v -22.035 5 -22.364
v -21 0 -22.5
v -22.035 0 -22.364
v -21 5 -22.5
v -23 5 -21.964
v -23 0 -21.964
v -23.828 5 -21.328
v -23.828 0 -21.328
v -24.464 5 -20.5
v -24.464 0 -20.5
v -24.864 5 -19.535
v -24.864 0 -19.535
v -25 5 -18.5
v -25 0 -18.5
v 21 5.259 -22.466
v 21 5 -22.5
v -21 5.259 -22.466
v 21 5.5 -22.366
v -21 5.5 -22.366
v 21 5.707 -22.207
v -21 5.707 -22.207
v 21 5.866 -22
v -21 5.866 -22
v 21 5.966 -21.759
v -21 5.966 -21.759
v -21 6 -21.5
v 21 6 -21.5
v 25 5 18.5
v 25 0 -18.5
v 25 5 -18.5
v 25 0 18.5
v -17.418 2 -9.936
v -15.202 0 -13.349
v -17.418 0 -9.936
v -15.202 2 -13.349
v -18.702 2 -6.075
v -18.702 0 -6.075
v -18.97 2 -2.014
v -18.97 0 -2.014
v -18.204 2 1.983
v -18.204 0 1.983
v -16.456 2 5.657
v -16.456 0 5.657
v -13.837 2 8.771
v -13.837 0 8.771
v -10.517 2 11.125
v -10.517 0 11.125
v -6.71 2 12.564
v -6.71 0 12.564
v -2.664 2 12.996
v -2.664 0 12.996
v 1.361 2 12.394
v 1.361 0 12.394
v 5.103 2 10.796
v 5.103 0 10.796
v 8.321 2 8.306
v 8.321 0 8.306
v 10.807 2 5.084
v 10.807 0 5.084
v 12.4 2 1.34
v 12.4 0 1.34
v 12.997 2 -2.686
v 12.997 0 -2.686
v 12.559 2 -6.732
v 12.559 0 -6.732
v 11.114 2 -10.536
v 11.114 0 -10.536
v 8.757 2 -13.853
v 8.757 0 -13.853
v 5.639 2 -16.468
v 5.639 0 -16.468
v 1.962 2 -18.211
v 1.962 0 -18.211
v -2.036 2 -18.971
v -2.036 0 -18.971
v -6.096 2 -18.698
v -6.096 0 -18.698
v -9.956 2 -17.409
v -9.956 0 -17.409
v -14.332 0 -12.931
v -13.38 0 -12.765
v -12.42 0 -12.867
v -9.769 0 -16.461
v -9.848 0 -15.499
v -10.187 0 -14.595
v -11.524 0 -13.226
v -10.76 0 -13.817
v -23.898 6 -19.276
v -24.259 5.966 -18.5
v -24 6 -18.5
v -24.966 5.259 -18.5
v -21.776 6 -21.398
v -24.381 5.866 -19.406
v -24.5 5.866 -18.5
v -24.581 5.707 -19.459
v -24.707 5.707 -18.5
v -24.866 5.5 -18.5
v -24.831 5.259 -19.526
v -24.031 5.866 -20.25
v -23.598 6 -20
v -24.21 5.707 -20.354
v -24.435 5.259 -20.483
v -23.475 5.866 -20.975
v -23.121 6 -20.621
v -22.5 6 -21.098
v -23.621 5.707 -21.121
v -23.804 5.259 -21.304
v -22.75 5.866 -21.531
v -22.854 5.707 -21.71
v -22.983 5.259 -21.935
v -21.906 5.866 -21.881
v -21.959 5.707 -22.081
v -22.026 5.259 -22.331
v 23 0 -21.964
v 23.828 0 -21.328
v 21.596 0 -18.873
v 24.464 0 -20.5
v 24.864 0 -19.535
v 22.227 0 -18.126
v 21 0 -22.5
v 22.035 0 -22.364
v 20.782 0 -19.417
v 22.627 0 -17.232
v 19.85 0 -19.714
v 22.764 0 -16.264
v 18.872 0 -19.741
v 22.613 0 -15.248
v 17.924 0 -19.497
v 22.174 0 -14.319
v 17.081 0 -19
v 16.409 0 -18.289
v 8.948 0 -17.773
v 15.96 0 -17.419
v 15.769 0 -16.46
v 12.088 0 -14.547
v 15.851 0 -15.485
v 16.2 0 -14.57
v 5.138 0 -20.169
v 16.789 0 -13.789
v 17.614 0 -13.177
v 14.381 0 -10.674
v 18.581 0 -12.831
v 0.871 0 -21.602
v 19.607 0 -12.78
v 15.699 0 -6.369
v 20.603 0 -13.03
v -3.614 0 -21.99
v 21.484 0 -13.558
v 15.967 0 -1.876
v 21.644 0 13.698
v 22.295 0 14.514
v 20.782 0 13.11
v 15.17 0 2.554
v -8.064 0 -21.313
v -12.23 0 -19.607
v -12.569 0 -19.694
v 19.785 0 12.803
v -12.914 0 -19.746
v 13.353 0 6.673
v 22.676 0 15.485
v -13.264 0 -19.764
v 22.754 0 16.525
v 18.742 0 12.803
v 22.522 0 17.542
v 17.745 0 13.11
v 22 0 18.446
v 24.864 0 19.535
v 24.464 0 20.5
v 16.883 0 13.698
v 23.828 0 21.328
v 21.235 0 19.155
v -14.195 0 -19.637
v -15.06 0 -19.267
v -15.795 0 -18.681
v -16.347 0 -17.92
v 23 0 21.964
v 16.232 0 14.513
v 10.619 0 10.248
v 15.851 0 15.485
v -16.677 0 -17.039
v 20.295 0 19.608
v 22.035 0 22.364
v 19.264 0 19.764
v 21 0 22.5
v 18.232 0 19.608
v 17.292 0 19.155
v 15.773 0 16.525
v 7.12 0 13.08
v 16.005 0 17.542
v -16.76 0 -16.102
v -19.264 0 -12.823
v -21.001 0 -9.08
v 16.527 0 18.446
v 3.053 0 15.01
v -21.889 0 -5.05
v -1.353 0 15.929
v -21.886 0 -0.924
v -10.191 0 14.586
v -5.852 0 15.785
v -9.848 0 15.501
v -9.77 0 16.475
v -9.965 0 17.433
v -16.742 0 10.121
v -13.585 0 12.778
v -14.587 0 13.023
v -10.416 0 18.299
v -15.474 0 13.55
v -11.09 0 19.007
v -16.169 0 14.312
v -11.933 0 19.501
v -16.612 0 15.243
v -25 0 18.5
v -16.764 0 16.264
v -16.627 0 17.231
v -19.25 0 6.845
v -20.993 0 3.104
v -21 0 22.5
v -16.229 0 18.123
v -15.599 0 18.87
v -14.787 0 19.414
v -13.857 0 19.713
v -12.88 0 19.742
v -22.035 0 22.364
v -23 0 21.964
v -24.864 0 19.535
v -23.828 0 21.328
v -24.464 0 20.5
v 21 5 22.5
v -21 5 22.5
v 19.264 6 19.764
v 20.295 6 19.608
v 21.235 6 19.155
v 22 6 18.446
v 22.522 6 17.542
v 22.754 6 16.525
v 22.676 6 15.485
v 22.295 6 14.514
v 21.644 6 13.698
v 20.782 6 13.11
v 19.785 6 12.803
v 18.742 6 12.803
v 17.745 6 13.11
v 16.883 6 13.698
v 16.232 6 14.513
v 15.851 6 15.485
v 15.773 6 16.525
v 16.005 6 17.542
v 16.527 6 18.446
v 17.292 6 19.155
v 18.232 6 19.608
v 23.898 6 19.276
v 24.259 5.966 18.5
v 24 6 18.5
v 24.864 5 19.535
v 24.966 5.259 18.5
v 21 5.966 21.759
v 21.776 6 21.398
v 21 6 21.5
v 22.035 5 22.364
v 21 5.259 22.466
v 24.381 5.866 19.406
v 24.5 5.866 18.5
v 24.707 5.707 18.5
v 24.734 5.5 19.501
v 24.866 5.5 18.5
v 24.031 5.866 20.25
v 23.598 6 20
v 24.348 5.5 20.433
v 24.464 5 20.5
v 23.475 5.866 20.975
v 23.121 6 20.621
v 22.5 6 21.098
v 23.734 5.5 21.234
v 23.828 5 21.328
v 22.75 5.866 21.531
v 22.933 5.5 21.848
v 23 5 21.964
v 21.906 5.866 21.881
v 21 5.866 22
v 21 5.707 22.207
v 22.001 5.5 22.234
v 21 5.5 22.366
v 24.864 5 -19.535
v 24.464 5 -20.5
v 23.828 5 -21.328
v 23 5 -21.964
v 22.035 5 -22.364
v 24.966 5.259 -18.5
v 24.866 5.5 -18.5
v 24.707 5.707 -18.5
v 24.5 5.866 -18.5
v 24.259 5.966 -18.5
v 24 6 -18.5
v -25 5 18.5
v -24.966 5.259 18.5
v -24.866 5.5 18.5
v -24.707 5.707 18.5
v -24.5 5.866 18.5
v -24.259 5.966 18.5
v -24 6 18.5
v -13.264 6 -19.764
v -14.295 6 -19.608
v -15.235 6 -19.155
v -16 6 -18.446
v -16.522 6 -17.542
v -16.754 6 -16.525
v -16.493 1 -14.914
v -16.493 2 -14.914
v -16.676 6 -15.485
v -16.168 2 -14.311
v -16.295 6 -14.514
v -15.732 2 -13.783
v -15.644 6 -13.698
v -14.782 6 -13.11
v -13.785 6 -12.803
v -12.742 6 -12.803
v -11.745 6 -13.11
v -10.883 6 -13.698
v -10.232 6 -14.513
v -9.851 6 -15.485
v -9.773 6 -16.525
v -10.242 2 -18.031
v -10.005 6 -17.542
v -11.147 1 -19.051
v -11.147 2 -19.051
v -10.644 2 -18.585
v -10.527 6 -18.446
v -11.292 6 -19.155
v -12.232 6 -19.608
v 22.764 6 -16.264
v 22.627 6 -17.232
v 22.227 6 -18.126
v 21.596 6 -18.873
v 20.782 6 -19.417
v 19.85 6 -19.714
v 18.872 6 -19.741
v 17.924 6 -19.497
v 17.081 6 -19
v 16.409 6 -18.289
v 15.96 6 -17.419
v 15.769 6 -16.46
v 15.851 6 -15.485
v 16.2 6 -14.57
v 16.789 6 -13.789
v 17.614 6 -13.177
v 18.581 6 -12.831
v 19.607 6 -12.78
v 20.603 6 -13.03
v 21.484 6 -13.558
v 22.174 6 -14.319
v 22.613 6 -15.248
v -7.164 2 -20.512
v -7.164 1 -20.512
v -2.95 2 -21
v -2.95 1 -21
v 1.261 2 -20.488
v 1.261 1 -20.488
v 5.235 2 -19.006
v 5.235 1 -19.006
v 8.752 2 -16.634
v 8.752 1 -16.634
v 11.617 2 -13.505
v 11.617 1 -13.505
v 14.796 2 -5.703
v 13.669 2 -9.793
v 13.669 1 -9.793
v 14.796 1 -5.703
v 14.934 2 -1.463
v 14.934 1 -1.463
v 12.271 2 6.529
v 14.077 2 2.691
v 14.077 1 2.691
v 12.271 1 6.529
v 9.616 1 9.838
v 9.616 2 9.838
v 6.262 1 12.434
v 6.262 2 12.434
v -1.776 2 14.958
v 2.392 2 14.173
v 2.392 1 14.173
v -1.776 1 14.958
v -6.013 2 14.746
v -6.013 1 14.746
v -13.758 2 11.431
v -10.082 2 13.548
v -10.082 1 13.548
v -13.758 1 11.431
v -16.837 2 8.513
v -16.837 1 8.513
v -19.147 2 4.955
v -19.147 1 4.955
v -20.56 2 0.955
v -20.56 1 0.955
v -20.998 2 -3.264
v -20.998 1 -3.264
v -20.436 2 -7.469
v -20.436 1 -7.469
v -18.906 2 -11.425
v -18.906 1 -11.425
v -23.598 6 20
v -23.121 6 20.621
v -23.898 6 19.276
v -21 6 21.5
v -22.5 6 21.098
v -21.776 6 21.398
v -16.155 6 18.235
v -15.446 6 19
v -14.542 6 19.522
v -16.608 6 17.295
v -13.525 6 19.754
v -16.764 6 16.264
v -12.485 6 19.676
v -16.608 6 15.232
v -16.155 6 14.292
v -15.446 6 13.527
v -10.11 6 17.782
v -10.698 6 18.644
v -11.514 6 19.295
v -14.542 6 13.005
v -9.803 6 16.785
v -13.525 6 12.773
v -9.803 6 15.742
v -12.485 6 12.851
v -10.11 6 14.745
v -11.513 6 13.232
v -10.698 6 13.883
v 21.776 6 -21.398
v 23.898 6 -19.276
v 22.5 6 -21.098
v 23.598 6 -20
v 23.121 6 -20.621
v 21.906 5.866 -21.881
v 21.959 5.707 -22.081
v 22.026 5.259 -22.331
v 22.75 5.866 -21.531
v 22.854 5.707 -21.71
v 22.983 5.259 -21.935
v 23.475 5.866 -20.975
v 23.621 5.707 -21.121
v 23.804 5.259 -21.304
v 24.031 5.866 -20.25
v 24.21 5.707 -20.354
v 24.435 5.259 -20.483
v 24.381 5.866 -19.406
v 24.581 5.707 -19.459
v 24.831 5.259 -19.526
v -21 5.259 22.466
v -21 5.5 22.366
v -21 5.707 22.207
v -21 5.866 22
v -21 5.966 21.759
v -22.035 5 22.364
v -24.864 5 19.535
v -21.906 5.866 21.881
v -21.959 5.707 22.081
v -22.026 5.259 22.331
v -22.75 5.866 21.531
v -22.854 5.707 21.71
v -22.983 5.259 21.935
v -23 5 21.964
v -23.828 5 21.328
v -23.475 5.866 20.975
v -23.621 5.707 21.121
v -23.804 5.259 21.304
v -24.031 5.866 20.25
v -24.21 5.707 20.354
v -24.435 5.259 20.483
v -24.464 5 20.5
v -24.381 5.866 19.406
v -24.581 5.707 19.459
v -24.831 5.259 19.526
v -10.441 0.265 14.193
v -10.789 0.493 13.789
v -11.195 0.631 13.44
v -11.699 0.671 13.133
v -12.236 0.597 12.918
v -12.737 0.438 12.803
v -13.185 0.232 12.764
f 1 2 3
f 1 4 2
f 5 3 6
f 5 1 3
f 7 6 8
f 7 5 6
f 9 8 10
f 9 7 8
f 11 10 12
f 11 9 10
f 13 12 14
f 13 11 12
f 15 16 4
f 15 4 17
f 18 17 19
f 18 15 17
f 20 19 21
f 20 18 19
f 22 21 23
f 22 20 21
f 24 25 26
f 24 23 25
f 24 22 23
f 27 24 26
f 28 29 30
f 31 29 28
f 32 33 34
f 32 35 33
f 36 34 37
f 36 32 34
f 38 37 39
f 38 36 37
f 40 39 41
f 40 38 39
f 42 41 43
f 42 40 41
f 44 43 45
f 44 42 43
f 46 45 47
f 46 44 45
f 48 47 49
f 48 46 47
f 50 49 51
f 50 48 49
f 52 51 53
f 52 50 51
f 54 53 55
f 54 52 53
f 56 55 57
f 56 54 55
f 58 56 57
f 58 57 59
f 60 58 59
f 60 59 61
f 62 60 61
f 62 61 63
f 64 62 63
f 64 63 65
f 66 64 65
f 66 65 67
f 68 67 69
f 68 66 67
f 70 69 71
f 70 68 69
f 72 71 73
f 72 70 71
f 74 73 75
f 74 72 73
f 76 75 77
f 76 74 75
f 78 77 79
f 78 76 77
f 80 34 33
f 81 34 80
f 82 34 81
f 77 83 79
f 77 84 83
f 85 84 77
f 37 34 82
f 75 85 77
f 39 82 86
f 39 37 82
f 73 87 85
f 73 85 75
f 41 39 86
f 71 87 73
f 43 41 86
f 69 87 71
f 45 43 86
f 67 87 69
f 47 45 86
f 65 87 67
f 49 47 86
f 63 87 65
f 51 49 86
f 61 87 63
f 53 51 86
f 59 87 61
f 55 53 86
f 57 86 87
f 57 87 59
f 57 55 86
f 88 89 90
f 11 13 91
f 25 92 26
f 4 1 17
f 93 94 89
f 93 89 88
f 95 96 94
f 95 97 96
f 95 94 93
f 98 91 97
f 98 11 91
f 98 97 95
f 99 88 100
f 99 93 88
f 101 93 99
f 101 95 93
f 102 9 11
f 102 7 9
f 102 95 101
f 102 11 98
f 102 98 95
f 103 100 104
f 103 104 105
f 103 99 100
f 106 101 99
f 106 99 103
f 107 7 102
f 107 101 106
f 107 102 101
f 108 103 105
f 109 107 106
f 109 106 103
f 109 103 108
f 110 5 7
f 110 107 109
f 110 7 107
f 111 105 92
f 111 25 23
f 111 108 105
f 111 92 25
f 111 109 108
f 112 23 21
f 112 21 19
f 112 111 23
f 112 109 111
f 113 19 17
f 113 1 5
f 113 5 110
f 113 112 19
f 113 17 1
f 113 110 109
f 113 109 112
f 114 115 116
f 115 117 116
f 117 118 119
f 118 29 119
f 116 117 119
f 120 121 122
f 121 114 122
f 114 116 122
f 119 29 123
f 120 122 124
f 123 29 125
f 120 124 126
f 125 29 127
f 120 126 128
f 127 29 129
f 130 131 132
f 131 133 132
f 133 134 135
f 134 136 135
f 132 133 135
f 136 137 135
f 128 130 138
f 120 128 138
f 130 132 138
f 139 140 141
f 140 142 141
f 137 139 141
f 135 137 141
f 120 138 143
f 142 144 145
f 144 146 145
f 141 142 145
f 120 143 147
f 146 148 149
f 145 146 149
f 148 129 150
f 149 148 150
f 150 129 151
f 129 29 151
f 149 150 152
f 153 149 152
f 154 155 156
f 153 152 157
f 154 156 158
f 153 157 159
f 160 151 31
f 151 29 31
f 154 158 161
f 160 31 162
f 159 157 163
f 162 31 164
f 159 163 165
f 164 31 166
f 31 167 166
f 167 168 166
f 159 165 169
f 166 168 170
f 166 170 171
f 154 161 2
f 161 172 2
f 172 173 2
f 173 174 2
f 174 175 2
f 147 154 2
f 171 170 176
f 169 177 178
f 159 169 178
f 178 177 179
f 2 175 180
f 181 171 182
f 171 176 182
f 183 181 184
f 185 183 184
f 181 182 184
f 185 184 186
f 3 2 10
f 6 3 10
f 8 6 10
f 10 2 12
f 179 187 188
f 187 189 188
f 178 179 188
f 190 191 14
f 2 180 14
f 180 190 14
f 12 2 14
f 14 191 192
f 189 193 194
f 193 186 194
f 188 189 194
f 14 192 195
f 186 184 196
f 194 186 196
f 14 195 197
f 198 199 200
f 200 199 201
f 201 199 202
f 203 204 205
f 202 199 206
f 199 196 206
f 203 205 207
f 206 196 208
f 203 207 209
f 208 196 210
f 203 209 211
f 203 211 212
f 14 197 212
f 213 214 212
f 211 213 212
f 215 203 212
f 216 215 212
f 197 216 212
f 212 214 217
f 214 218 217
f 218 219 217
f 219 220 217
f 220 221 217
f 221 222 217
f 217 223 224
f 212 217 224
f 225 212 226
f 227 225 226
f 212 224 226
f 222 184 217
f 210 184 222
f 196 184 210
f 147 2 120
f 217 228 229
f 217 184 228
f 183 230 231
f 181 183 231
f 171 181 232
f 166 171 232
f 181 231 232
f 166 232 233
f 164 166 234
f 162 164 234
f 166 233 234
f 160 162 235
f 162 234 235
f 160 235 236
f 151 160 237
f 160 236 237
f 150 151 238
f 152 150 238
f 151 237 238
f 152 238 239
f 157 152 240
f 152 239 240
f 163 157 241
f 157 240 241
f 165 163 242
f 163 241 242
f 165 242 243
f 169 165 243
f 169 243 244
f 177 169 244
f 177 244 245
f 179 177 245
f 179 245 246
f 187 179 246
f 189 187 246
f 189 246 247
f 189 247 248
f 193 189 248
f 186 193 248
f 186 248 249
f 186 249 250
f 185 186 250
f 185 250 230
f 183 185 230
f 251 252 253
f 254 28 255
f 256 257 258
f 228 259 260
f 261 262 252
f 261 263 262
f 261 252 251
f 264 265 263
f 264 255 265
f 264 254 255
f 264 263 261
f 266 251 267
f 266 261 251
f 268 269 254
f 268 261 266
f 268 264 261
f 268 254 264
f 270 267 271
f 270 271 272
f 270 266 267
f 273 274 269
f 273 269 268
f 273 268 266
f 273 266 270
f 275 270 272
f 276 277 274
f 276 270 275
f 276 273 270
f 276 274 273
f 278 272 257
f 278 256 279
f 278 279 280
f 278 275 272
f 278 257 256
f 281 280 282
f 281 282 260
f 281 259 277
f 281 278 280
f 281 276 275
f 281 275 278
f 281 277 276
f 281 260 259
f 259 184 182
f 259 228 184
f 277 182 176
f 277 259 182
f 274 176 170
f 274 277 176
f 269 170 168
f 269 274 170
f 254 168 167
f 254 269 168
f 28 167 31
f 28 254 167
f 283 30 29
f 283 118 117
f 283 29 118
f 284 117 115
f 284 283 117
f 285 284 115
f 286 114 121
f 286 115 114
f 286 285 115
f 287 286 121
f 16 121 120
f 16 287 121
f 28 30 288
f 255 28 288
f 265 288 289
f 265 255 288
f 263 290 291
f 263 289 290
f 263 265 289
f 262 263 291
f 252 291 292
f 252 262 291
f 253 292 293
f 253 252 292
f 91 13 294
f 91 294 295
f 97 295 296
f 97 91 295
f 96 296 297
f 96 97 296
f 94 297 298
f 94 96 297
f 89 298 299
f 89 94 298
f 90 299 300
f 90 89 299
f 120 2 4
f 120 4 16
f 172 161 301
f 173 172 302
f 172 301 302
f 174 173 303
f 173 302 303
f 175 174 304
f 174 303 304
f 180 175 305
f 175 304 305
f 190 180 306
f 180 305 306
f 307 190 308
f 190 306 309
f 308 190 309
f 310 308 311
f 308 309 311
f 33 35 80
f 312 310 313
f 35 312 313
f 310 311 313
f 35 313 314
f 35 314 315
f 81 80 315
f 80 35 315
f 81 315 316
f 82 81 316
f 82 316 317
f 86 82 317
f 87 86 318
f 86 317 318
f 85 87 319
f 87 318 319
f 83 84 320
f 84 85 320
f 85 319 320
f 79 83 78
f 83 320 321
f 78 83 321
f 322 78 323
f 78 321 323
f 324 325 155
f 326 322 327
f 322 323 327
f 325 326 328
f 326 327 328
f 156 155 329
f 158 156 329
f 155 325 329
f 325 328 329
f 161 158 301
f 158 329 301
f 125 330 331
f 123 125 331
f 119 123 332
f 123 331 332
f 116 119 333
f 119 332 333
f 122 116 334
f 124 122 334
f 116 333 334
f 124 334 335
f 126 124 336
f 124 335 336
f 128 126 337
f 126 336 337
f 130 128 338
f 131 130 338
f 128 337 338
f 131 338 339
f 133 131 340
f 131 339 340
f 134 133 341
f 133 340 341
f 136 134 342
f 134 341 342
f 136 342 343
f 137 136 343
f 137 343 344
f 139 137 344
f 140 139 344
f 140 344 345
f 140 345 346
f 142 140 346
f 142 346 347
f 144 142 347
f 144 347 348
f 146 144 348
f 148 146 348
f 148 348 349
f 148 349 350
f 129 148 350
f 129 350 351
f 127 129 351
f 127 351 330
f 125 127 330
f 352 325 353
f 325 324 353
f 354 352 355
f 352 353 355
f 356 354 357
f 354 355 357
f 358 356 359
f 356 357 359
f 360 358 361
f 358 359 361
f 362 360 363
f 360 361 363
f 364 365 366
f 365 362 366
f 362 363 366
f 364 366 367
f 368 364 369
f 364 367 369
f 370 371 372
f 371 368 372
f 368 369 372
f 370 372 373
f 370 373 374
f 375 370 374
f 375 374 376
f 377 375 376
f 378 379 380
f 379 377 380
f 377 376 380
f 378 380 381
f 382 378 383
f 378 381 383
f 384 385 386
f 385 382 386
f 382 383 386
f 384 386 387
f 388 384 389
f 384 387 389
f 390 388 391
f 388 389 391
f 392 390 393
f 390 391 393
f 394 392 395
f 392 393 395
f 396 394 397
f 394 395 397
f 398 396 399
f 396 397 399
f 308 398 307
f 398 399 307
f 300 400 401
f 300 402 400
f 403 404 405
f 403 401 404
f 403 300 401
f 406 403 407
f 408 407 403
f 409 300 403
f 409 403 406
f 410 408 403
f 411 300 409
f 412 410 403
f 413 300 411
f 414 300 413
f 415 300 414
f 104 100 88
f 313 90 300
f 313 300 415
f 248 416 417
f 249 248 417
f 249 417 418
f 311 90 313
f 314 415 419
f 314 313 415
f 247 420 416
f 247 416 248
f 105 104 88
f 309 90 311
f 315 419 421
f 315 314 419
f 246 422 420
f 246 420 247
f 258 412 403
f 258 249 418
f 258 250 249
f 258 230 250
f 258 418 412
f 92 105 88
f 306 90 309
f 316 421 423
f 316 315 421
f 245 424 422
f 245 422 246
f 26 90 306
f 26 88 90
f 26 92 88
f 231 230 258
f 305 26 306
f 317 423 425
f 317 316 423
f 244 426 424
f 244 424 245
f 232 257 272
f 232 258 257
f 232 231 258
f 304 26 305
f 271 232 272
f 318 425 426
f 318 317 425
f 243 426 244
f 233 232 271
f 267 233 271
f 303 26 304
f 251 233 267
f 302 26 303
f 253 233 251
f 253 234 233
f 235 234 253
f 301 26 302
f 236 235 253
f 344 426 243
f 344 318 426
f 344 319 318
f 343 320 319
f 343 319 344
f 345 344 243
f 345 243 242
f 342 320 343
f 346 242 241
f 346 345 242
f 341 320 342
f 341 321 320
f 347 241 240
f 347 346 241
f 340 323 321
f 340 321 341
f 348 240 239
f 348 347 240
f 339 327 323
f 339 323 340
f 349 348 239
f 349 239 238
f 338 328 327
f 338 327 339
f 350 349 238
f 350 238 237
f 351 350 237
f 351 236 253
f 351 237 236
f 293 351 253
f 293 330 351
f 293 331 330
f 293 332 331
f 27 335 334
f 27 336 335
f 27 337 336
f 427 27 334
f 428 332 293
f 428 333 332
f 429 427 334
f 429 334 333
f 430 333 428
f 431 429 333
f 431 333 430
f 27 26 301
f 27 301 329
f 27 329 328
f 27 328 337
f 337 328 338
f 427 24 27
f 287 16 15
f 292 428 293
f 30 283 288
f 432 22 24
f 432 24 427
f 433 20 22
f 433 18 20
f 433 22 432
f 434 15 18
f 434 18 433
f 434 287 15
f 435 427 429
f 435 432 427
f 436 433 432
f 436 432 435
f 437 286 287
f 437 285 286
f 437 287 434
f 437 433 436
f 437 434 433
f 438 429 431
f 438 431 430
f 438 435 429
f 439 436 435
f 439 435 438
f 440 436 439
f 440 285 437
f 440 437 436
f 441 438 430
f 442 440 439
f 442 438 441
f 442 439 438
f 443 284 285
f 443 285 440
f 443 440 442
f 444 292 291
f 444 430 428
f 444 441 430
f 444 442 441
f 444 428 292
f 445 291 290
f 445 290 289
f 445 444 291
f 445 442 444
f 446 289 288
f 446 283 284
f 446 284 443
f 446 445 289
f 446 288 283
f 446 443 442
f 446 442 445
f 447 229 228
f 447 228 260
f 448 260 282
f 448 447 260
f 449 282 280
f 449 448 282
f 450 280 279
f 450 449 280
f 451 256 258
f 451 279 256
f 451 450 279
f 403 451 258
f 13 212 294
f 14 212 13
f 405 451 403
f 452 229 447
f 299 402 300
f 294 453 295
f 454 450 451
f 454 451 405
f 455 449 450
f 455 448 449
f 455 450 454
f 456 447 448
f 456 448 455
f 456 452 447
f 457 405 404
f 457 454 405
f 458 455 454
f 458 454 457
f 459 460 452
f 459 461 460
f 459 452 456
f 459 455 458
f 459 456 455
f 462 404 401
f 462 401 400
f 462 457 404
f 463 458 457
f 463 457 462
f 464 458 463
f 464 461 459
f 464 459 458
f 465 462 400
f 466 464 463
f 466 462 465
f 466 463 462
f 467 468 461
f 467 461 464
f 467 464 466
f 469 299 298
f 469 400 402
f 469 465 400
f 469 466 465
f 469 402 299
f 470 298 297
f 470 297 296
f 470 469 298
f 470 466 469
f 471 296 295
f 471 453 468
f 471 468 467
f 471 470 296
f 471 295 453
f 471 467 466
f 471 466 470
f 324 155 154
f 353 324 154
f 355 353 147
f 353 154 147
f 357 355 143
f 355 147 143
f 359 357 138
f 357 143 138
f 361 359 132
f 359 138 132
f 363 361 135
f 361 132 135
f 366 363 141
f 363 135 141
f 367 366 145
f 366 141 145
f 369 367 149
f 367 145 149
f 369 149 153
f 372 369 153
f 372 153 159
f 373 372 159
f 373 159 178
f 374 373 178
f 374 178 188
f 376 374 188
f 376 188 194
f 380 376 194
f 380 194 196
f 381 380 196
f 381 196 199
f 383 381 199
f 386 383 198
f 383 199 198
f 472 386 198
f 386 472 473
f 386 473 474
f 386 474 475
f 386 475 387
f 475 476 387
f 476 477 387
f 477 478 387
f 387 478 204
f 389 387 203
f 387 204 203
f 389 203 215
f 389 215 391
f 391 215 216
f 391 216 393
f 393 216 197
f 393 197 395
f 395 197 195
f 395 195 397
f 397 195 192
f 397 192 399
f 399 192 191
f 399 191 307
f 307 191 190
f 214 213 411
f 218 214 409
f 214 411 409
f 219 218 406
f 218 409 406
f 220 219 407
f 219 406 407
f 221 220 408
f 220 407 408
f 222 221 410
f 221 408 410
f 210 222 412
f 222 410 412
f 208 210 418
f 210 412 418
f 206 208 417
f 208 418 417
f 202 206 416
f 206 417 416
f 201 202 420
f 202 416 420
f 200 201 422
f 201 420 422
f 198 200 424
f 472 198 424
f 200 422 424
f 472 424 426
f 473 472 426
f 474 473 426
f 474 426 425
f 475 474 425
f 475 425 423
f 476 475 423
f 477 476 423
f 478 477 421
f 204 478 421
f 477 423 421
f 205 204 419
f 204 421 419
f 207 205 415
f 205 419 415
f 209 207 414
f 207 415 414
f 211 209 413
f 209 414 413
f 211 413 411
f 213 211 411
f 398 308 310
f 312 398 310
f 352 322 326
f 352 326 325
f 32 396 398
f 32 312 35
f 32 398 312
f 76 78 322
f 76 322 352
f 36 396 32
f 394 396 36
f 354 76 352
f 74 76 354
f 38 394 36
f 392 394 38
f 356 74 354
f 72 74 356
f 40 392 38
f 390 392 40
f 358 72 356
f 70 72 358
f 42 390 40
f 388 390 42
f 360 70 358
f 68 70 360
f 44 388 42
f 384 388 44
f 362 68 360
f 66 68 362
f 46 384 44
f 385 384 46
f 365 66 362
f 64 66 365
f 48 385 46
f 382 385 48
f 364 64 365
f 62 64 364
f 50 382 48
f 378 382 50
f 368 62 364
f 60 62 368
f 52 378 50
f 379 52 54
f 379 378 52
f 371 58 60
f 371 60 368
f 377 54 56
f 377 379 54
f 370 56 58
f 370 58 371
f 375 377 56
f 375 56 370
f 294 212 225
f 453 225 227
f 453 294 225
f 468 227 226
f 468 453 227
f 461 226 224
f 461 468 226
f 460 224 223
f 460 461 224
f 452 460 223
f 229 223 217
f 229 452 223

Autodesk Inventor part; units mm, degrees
ref_plane "YZ Plane" through (0, 0, 0) normal (1, 0, 0) x (0, 1, 0)
ref_plane "XZ Plane" through (0, 0, 0) normal (0, 1, 0) x (-1, 0, 0)
ref_plane "XY Plane" through (0, 0, 0) normal (0, 0, 1) x (1, 0, 0)
sketch "Sketch1" plane through (0, 0, 0) normal (0, 1, 0) x (-1, 0, 0)
  line L0 (25, -22.5) -> (-25, -22.5)
  line L1 (-25, -22.5) -> (-25, 22.5)
  line L2 (-25, 22.5) -> (25, 22.5)
  line L3 (25, 22.5) -> (25, -22.5)
  line L4 (25, -22.5) -> (-25, 22.5) construction
  line L5 (-25, -22.5) -> (25, 22.5) construction
  line L6 (0, 0) -> (-3, 0)
  circle A0 centre (-3, 0) radius 16
  line L7 (-3, 0) -> (-19.2635, -16.2635)
  line L8 (-3, 0) -> (20, 0) construction
  circle A1 centre (-19.2635, -16.2635) radius 3.5
  dimension "d0" = 50
  dimension "d1" = 45
  dimension "d35" = 0
  dimension "d36" = 3
  dimension "d37" = 32
  dimension "d38" = 23
  dimension "d39" = 135
  dimension "d40" = 7
extrude "Extrusion1" add sketch "Sketch1" along normal blind 6 contours L0 L1 L2 L3 | A0 | A1
fillet "Fillet1" radius 4 4 edges at (25, 3, 22.5) (25, 3, -22.5) (-25, 3, -22.5) (-25, 3, 22.5)
fillet "Fillet2" radius 1 8 edges at (23.8284, 6, 21.3284) (25, 6, 0) (23.8284, 6, -21.3284) (0, 6, -22.5) (-23.8284, 6, -21.3284) (-25, 6, 0) (-23.8284, 6, 21.3284) (0, 6, 22.5)
sketch "Sketch6" plane through (0, 0, 0) normal (0, -1, 0) x (1, 0, 0)
  circle A0 centre (-3, -3) radius 18
  point P0 (0, 0)
  dimension "d21" = 36
extrude "Extrusion6" cut sketch "Sketch6" against normal blind 2
sketch "Sketch7" plane through (-3, 2, -3) normal (0, -1, 0) x (1, 0, 0)
  circle A0 centre (0, 0) radius 16
  point P0 (3, 3)
  dimension "d27" = 32
extrude "Extrusion7" add sketch "Sketch7" along normal blind 2
chamfer "Chamfer1" distance 1 distance2 1 1 edges at (-21, 0, -3) measured on face at (21.6667, 0, -1)
sketch "Sketch10" plane through (0, 6, 0) normal (0, 1, 0) x (1, 0, 0)
  line L0 (0, 0) -> (3, 0)
  line L1 (3, 0) -> (19.2635, 16.2635)
  circle A0 centre (19.2635, 16.2635) radius 3.5
  dimension "d43" = 3
  dimension "d44" = 23
  dimension "d45" = 135
  dimension "d46" = 7
extrude "Extrusion8" cut sketch "Sketch10" against normal blind 10
sketch "Sketch11" plane through (0, 6, 0) normal (0, 1, 0) x (1, 0, 0)
  circle A0 centre (3, 0) radius 16
  point P0 (0, 0)
  dimension "d49" = 32
extrude "Extrusion9" cut sketch "Sketch11" against normal blind 2
pattern_circular "Circular Pattern2" count 4 over 360 about axis through (3, 6, 0) along (0, -1, 0) of "Extrusion8"
sketch "Sketch12" plane through (3, 4, 0) normal (0, 1, 0) x (1, 0, 0)
  circle A0 centre (0, 0) radius 16
  point P0 (-3, 0)
  dimension "d55" = 32
extrude "Extrusion10" add sketch "Sketch12" along normal blind 2
properties part number "cylinder head"
